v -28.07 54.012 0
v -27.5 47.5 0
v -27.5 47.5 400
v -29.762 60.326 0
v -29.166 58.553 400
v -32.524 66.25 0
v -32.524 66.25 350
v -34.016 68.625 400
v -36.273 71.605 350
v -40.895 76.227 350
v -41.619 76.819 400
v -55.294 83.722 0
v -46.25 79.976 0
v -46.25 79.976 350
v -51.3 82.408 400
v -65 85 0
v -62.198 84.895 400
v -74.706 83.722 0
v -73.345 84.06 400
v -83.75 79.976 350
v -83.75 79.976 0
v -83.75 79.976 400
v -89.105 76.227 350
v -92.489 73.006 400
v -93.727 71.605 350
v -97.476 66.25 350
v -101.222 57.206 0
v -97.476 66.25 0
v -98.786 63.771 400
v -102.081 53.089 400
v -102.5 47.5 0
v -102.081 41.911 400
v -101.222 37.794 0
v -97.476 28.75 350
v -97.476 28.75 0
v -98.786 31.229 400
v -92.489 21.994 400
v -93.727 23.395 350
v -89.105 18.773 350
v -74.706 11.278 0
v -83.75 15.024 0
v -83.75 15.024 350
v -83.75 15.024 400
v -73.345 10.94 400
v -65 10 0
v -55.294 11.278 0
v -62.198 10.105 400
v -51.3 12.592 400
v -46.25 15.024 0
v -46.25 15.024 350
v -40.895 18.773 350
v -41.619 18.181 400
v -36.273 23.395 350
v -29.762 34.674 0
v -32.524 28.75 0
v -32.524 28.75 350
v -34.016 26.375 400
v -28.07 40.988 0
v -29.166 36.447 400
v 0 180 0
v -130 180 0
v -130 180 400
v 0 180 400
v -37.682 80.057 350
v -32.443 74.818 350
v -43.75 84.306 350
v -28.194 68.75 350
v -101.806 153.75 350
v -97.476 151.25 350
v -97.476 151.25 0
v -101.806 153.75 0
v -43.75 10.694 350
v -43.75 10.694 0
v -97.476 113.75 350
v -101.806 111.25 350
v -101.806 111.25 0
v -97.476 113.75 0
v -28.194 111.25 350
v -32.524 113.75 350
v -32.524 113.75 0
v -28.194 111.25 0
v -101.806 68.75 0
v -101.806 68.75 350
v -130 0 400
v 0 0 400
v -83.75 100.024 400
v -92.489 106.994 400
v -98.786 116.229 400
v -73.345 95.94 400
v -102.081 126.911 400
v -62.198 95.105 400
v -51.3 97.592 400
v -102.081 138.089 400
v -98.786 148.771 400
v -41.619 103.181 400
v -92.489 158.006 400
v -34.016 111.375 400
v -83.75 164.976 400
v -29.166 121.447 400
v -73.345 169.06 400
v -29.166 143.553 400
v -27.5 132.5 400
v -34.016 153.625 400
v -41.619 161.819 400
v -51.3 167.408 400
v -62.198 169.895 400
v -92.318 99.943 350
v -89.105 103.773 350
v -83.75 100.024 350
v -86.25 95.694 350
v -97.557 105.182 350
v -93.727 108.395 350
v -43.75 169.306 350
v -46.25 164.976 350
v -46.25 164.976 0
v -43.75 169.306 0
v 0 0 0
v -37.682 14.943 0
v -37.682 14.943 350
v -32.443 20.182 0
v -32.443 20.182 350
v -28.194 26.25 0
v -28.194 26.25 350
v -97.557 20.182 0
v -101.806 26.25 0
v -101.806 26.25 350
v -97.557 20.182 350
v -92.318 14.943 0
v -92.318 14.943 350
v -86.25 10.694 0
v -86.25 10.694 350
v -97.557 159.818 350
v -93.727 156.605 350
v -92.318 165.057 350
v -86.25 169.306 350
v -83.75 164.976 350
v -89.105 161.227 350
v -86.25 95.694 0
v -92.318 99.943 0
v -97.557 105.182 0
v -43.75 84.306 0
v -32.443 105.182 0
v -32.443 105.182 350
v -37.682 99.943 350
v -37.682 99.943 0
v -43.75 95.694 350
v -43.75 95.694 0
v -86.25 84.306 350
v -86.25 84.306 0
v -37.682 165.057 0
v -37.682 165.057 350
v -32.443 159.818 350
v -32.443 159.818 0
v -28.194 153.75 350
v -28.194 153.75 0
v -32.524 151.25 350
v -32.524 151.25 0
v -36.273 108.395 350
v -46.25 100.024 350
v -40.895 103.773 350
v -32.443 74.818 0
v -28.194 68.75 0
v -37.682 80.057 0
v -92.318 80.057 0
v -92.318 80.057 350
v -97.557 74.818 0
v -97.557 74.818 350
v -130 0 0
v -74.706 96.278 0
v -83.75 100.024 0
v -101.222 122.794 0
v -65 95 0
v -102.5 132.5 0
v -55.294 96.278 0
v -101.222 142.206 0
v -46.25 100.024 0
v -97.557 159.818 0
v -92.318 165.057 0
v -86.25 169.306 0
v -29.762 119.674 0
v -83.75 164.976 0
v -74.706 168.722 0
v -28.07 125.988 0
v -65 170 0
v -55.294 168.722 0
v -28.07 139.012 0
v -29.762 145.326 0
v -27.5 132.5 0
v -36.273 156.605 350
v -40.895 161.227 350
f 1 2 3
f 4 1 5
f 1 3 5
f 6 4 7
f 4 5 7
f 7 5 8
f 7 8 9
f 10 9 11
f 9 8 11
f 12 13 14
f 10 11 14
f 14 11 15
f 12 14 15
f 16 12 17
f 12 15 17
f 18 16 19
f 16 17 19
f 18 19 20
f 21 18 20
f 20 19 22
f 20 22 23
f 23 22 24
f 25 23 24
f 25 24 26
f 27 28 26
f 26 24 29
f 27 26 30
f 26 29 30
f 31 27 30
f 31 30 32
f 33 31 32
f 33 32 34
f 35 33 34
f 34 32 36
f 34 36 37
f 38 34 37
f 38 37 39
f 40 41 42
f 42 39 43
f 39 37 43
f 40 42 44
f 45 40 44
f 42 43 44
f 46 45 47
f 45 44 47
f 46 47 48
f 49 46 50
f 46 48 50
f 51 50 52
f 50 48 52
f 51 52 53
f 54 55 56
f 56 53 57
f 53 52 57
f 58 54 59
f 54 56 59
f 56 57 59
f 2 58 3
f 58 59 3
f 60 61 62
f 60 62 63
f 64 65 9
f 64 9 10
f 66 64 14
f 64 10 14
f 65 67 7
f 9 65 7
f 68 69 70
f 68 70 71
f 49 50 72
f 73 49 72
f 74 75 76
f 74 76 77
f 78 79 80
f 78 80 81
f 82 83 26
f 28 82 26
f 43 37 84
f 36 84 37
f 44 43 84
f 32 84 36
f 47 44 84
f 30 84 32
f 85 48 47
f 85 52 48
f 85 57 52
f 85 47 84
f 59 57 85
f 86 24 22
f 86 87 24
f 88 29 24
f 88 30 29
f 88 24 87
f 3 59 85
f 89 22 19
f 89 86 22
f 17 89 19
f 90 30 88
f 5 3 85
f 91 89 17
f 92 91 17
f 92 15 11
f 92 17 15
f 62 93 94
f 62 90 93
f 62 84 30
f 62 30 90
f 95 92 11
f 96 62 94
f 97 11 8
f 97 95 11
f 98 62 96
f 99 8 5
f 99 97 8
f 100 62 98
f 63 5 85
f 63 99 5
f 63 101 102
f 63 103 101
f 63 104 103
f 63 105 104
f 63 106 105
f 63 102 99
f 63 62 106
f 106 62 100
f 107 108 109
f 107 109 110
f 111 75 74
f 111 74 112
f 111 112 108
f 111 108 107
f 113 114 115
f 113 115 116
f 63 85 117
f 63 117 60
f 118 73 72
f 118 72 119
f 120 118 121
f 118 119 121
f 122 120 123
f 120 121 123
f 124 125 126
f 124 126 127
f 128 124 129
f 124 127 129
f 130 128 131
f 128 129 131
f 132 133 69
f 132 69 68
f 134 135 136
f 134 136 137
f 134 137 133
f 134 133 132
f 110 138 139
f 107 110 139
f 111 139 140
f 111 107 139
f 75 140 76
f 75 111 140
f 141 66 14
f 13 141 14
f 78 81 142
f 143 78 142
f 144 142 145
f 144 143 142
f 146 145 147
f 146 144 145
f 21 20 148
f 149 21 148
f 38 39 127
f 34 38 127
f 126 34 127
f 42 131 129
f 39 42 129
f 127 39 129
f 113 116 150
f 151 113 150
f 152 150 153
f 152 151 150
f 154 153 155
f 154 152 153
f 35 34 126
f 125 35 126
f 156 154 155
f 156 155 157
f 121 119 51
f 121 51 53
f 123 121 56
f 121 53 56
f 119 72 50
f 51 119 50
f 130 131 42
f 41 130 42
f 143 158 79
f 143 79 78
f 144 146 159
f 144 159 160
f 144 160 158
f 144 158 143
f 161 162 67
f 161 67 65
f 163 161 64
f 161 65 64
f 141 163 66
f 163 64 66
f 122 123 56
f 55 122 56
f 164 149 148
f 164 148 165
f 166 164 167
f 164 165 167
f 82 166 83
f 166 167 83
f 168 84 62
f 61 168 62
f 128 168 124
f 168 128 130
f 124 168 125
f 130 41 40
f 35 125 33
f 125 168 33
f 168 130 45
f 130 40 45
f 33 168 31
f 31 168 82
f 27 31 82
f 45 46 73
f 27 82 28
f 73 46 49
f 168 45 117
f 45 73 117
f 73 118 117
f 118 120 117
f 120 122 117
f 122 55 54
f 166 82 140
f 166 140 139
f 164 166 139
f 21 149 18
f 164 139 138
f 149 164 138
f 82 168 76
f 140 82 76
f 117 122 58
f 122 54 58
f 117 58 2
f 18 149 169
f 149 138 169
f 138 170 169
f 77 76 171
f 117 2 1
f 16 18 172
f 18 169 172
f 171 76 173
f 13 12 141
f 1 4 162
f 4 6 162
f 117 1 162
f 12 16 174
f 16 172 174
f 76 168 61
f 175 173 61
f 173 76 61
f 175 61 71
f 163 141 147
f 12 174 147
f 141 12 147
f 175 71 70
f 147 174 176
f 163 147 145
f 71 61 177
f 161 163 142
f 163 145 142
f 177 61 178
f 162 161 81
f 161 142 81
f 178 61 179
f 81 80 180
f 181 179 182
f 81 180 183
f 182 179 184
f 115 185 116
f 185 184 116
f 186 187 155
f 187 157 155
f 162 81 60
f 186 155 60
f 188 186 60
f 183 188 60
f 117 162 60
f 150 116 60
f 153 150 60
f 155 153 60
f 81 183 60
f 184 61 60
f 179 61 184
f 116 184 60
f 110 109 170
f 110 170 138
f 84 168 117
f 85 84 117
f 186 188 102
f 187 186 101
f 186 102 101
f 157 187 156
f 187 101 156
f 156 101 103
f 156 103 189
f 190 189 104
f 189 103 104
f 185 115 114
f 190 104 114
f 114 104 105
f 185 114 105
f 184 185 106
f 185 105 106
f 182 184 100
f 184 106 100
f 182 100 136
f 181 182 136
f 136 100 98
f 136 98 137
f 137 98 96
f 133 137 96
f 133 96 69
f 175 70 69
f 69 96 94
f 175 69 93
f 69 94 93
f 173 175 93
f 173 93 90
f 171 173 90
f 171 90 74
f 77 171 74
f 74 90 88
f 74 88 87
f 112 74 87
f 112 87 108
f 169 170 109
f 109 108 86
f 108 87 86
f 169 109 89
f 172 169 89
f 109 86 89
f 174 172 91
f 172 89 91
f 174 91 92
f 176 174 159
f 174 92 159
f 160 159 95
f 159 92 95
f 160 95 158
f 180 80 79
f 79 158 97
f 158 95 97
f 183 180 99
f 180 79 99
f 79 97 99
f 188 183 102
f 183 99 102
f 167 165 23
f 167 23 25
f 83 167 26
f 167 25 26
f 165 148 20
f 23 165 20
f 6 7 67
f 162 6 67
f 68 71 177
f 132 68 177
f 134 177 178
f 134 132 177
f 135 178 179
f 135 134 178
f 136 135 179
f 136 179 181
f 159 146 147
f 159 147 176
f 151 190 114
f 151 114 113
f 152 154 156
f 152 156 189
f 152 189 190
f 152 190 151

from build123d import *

# Parameters (mm, degrees)
SKETCH_1_W               = 130
SKETCH_1_H               = 180
EXTRUDE_1_DEPTH          = 400
SKETCH_2_R               = 37.5
CUT_EXTRUDE_1_DEPTH      = 458.493169348
CUT_EXTRUDE_START        = -350
CUT_EXTRUDE_2_DEPTH      = 350
PATTERN_CIRCULAR_1_COUNT = 4
MIRROR_START             = -350
MIRROR_1_COPY_1_DEPTH    = 350
MIRROR_1_COPY_2_DEPTH    = 350
MIRROR_1_COPY_3_DEPTH    = 350
MIRROR_1_COPY_4_DEPTH    = 350


with BuildPart() as part:
    # 草圖1 → 填料-伸長1 (new body)
    with BuildSketch(Plane.XY):
        with Locations((-65, 90)):
            Rectangle(SKETCH_1_W, SKETCH_1_H)
    extrude(amount=EXTRUDE_1_DEPTH)

    # 草圖2 → 除料-伸長1 (cut, through all)
    with BuildSketch(Plane.XY.offset(400)):
        with Locations((-65, 132.5)):
            Circle(SKETCH_2_R)
        with Locations((-65, 47.5)):
            Circle(SKETCH_2_R)
    extrude(amount=-CUT_EXTRUDE_1_DEPTH, mode=Mode.SUBTRACT)

    # 草圖4 → 除料-伸長2 (cut)
    with BuildSketch(Plane(origin=(0, 0, 0), x_dir=(-1, 0, 0), z_dir=(0, 0, -1)).offset(CUT_EXTRUDE_START)):
        with BuildLine():
            Line((86.25, 169.306079661), (83.75, 164.975952642))
            ThreePointArc((83.75, 164.975952642), (91.516504294, 159.016504294), (97.475952642, 151.25))
            Line((97.475952642, 151.25), (101.806079661, 153.75))
            ThreePointArc((101.806079661, 153.75), (95.0520382, 162.5520382), (86.25, 169.306079661))
        make_face()
    cut_extrude_2 = extrude(amount=CUT_EXTRUDE_2_DEPTH, mode=Mode.SUBTRACT)

    # 環狀複製排列1: 除料-伸長2 ×4 about axis
    pattern_circular_1_axis = Axis((-65, 132.5, 0), (0, 0, 1))
    for i in range(1, PATTERN_CIRCULAR_1_COUNT):
        add(cut_extrude_2.rotate(pattern_circular_1_axis, i * 360 / PATTERN_CIRCULAR_1_COUNT), mode=Mode.SUBTRACT)

    # 鏡射1 copy 1 sketch → 鏡射1 copy 1 (cut)
    with BuildSketch(Plane(origin=(67.5, -17.5, 0), x_dir=(0, 1, 0), z_dir=(0, 0, -1)).offset(MIRROR_START)):
        with BuildLine():
            Line((86.25, -169.306079661), (83.75, -164.975952642))
            ThreePointArc((83.75, -164.975952642), (91.516504294, -159.016504294), (97.475952642, -151.25))
            Line((97.475952642, -151.25), (101.806079661, -153.75))
            ThreePointArc((101.806079661, -153.75), (95.0520382, -162.5520382), (86.25, -169.306079661))
        make_face()
    extrude(amount=MIRROR_1_COPY_1_DEPTH, mode=Mode.SUBTRACT)

    # 鏡射1 copy 2 sketch → 鏡射1 copy 2 (cut)
    with BuildSketch(Plane(origin=(-130, -85, 0), x_dir=(1, 0, 0), z_dir=(0, 0, -1)).offset(MIRROR_START)):
        with BuildLine():
            Line((86.25, -169.306079661), (83.75, -164.975952642))
            ThreePointArc((83.75, -164.975952642), (91.516504294, -159.016504294), (97.475952642, -151.25))
            Line((97.475952642, -151.25), (101.806079661, -153.75))
            ThreePointArc((101.806079661, -153.75), (95.0520382, -162.5520382), (86.25, -169.306079661))
        make_face()
    extrude(amount=MIRROR_1_COPY_2_DEPTH, mode=Mode.SUBTRACT)

    # 鏡射1 copy 3 sketch → 鏡射1 copy 3 (cut)
    with BuildSketch(Plane(origin=(-197.5, 112.5, 0), x_dir=(0, -1, 0), z_dir=(0, 0, -1)).offset(MIRROR_START)):
        with BuildLine():
            Line((86.25, -169.306079661), (83.75, -164.975952642))
            ThreePointArc((83.75, -164.975952642), (91.516504294, -159.016504294), (97.475952642, -151.25))
            Line((97.475952642, -151.25), (101.806079661, -153.75))
            ThreePointArc((101.806079661, -153.75), (95.0520382, -162.5520382), (86.25, -169.306079661))
        make_face()
    extrude(amount=MIRROR_1_COPY_3_DEPTH, mode=Mode.SUBTRACT)

    # 鏡射1 copy 4 sketch → 鏡射1 copy 4 (cut)
    with BuildSketch(Plane(origin=(0, 180, 0), x_dir=(-1, 0, 0), z_dir=(0, 0, -1)).offset(MIRROR_START)):
        with BuildLine():
            Line((86.25, -169.306079661), (83.75, -164.975952642))
            ThreePointArc((83.75, -164.975952642), (91.516504294, -159.016504294), (97.475952642, -151.25))
            Line((97.475952642, -151.25), (101.806079661, -153.75))
            ThreePointArc((101.806079661, -153.75), (95.0520382, -162.5520382), (86.25, -169.306079661))
        make_face()
    extrude(amount=MIRROR_1_COPY_4_DEPTH, mode=Mode.SUBTRACT)


solid = part.part
